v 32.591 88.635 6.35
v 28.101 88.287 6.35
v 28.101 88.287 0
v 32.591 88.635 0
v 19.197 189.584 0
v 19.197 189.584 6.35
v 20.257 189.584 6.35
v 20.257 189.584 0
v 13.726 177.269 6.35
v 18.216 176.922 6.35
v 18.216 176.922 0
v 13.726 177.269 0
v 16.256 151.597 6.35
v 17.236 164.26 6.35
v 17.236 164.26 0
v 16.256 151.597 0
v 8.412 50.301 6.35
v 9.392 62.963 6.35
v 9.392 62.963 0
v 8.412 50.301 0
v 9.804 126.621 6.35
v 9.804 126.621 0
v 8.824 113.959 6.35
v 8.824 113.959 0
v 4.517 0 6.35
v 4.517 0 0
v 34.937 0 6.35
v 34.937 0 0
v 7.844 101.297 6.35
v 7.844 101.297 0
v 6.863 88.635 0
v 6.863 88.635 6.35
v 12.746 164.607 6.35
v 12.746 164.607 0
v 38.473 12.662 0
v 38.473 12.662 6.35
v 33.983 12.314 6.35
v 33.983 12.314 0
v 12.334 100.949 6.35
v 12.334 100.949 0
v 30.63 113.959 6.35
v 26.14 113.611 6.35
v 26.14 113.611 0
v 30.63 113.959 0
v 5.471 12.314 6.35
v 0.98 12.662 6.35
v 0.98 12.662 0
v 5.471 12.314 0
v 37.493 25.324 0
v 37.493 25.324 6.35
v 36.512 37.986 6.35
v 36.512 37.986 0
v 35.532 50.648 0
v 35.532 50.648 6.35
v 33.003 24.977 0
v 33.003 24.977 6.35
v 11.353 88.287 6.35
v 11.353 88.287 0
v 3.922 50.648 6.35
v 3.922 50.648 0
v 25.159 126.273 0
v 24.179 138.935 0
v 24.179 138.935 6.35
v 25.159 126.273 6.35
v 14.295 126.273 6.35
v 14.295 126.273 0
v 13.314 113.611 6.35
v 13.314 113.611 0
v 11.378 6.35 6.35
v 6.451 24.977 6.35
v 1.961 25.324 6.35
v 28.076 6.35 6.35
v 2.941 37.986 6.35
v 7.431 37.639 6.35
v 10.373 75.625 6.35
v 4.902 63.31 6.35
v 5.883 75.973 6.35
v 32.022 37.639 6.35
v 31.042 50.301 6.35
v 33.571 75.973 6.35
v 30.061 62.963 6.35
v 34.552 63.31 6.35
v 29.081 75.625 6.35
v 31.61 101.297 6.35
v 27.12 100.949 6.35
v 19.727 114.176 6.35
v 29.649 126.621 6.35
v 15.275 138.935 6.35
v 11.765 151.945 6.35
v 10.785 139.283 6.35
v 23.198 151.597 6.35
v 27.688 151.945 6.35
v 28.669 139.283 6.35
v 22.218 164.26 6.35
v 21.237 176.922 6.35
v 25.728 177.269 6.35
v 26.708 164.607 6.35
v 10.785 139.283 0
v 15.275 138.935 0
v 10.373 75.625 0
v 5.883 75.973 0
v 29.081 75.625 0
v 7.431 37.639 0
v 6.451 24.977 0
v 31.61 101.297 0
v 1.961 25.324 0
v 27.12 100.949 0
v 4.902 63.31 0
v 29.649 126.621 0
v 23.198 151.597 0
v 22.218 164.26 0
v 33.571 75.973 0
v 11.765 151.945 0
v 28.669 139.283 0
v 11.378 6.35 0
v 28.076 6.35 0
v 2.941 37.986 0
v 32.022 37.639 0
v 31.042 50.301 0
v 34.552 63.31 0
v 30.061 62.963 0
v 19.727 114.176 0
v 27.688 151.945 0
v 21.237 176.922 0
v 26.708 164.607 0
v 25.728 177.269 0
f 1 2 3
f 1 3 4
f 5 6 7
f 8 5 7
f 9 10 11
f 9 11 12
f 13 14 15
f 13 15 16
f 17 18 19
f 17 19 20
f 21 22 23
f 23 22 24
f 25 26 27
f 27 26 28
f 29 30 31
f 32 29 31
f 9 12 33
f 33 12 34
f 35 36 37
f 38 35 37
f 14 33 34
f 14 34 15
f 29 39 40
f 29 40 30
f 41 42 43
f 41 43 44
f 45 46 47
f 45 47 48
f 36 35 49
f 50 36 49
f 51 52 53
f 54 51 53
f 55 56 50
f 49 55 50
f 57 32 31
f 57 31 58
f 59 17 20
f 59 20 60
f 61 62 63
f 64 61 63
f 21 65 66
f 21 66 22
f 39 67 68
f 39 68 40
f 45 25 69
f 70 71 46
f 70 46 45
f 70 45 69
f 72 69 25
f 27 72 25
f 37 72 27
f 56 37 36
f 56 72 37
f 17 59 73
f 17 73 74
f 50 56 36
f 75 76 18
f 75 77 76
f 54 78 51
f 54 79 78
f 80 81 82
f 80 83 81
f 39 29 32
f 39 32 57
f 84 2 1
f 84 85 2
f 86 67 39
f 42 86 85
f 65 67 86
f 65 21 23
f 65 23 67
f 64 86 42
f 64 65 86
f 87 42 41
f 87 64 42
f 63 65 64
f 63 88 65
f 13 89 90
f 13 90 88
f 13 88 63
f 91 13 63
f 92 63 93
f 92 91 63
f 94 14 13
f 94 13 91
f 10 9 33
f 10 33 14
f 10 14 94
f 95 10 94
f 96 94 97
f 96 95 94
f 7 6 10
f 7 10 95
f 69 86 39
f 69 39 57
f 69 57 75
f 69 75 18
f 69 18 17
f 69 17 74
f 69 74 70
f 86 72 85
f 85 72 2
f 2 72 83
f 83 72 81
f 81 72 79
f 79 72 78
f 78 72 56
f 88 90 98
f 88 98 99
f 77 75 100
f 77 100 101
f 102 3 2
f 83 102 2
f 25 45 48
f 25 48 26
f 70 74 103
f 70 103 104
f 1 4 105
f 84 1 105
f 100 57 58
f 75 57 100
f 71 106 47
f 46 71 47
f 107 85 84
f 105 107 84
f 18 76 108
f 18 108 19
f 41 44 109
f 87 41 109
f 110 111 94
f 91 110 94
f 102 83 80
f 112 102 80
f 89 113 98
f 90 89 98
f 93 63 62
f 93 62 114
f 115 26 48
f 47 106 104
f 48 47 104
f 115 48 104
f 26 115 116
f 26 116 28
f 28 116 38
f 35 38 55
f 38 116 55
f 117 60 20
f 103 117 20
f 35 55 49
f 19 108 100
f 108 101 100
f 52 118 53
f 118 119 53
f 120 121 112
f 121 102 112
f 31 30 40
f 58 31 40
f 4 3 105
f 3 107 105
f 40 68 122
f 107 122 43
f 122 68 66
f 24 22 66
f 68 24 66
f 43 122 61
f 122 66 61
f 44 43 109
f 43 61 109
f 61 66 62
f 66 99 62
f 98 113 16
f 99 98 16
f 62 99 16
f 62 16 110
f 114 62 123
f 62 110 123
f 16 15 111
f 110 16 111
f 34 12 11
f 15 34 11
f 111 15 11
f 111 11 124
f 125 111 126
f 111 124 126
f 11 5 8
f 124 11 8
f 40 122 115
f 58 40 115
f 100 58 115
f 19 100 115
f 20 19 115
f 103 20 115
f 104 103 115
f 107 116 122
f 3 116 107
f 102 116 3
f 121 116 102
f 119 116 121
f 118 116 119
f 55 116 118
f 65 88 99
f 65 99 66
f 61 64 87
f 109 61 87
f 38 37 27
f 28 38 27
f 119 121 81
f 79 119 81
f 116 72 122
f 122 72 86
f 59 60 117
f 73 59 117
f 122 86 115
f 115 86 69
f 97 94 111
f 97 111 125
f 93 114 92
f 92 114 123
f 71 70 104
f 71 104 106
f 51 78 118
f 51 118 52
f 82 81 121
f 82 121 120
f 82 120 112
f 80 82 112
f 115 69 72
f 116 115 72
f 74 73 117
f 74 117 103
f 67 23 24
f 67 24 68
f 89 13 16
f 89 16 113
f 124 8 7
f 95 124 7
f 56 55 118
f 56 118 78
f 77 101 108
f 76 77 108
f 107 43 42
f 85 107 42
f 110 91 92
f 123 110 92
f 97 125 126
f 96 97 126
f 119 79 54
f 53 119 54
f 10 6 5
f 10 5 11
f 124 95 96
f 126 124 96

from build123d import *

# Parameters (mm, degrees)
BOSS_EXTRUDE1_DEPTH   = 6.35
CUT_EXTRUDE1_DEPTH    = 258.879971193
LPATTERN1_COUNT       = 9
LPATTERN1_PITCH       = 25.4
CUT_EXTRUDE2_DEPTH    = 258.879971193
LPATTERN3_START       = -252.481631985
LPATTERN3_OUTLINE_W   = 4.50356866
LPATTERN3_OUTLINE_H   = 6.35
LPATTERN3_DEPTH       = 52.327499141
LPATTERN3_START_2     = -187.454132844
LPATTERN3_2_OUTLINE_W = 4.50356866
LPATTERN3_2_OUTLINE_H = 6.35
LPATTERN3_2_DEPTH     = 12.7
LPATTERN3_START_3     = -162.054132844
LPATTERN3_3_OUTLINE_W = 4.50356866
LPATTERN3_3_OUTLINE_H = 6.35
LPATTERN3_3_DEPTH     = 12.7
LPATTERN3_START_4     = -136.654132844
LPATTERN3_4_OUTLINE_W = 4.50356866
LPATTERN3_4_OUTLINE_H = 6.35
LPATTERN3_4_DEPTH     = 12.7
LPATTERN3_START_5     = -111.254132844
LPATTERN3_5_OUTLINE_W = 4.50356866
LPATTERN3_5_OUTLINE_H = 6.35
LPATTERN3_5_DEPTH     = 12.7
LPATTERN3_START_6     = -85.854132844
LPATTERN3_6_OUTLINE_W = 4.50356866
LPATTERN3_6_OUTLINE_H = 6.35
LPATTERN3_6_DEPTH     = 12.7
LPATTERN3_START_7     = -60.454132844
LPATTERN3_7_OUTLINE_W = 4.50356866
LPATTERN3_7_OUTLINE_H = 6.35
LPATTERN3_7_DEPTH     = 12.7
LPATTERN3_START_8     = -35.054132844
LPATTERN3_8_OUTLINE_W = 4.50356866
LPATTERN3_8_OUTLINE_H = 6.35
LPATTERN3_8_DEPTH     = 12.7
LPATTERN3_START_9     = -225.661600657
LPATTERN3_9_OUTLINE_W = 2.832525799
LPATTERN3_9_OUTLINE_H = 6.35
LPATTERN3_9_DEPTH     = 13.028393953
SKETCH4_W             = 28.782231323
SKETCH4_H             = 17.896251878
CUT_EXTRUDE3_DEPTH    = 207.312084539
CUT_EXTRUDE4_DEPTH    = 194.552412762


# Read off the part's stored shape, not the designer's step: LPattern3
with BuildPart() as part:
    # Sketch1 → Boss-Extrude1 (new body)
    with BuildSketch(Plane.XY):
        Polygon((19.726920908, 254.76489438), (0, 0), (39.453841816, 0), align=None)
    extrude(amount=BOSS_EXTRUDE1_DEPTH)

    # Sketch2 → Cut-Extrude1 (cut, through all)
    with BuildSketch(Plane.XY.offset(6.35)):
        Polygon((0, 0), (0.98044984, 12.662097698), (5.4705779, 12.314418708), (4.490128061, -0.34767899), align=None)
    cut_extrude1 = extrude(amount=-CUT_EXTRUDE1_DEPTH, mode=Mode.SUBTRACT)

    # LPattern1: Cut-Extrude1 ×9
    with Locations(*[Vector(0.07720077476736964, 0.9970155667667973, 0) * (i * LPATTERN1_PITCH) for i in range(1, LPATTERN1_COUNT)]):
        add(cut_extrude1, mode=Mode.SUBTRACT)

    # Sketch3 → Cut-Extrude2 (cut, through all)
    with BuildSketch(Plane.XY.offset(6.35)):
        Polygon((39.453841816, 0), (38.473391976, 12.662097698), (33.983263916, 12.314418708), (34.963713756, -0.34767899), align=None)
    extrude(amount=-CUT_EXTRUDE2_DEPTH, mode=Mode.SUBTRACT)

    # LPattern3 outline → LPattern3 (cut)
    with BuildSketch(Plane(origin=(0, 0, 0), x_dir=(0.9970155667667971, 0.07720077476736921, 0), z_dir=(0.07720077476736921, -0.9970155667667973, 0)).offset(LPATTERN3_START)):
        with Locations((37.084310129, 3.175)):
            Rectangle(LPATTERN3_OUTLINE_W, LPATTERN3_OUTLINE_H)
    extrude(amount=LPATTERN3_DEPTH, mode=Mode.SUBTRACT)

    # LPattern3 2 outline → LPattern3 2 (cut)
    with BuildSketch(Plane(origin=(0, 0, 0), x_dir=(0.9970155667667971, 0.07720077476736921, 0), z_dir=(0.07720077476736921, -0.9970155667667973, 0)).offset(LPATTERN3_START_2)):
        with Locations((37.084310129, 3.175)):
            Rectangle(LPATTERN3_2_OUTLINE_W, LPATTERN3_2_OUTLINE_H)
    extrude(amount=LPATTERN3_2_DEPTH, mode=Mode.SUBTRACT)

    # LPattern3 3 outline → LPattern3 3 (cut)
    with BuildSketch(Plane(origin=(0, 0, 0), x_dir=(0.9970155667667971, 0.07720077476736921, 0), z_dir=(0.07720077476736921, -0.9970155667667973, 0)).offset(LPATTERN3_START_3)):
        with Locations((37.084310129, 3.175)):
            Rectangle(LPATTERN3_3_OUTLINE_W, LPATTERN3_3_OUTLINE_H)
    extrude(amount=LPATTERN3_3_DEPTH, mode=Mode.SUBTRACT)

    # LPattern3 4 outline → LPattern3 4 (cut)
    with BuildSketch(Plane(origin=(0, 0, 0), x_dir=(0.9970155667667971, 0.07720077476736921, 0), z_dir=(0.07720077476736921, -0.9970155667667973, 0)).offset(LPATTERN3_START_4)):
        with Locations((37.084310129, 3.175)):
            Rectangle(LPATTERN3_4_OUTLINE_W, LPATTERN3_4_OUTLINE_H)
    extrude(amount=LPATTERN3_4_DEPTH, mode=Mode.SUBTRACT)

    # LPattern3 5 outline → LPattern3 5 (cut)
    with BuildSketch(Plane(origin=(0, 0, 0), x_dir=(0.9970155667667971, 0.07720077476736921, 0), z_dir=(0.07720077476736921, -0.9970155667667973, 0)).offset(LPATTERN3_START_5)):
        with Locations((37.084310129, 3.175)):
            Rectangle(LPATTERN3_5_OUTLINE_W, LPATTERN3_5_OUTLINE_H)
    extrude(amount=LPATTERN3_5_DEPTH, mode=Mode.SUBTRACT)

    # LPattern3 6 outline → LPattern3 6 (cut)
    with BuildSketch(Plane(origin=(0, 0, 0), x_dir=(0.9970155667667971, 0.07720077476736921, 0), z_dir=(0.07720077476736921, -0.9970155667667973, 0)).offset(LPATTERN3_START_6)):
        with Locations((37.084310129, 3.175)):
            Rectangle(LPATTERN3_6_OUTLINE_W, LPATTERN3_6_OUTLINE_H)
    extrude(amount=LPATTERN3_6_DEPTH, mode=Mode.SUBTRACT)

    # LPattern3 7 outline → LPattern3 7 (cut)
    with BuildSketch(Plane(origin=(0, 0, 0), x_dir=(0.9970155667667971, 0.07720077476736921, 0), z_dir=(0.07720077476736921, -0.9970155667667973, 0)).offset(LPATTERN3_START_7)):
        with Locations((37.084310129, 3.175)):
            Rectangle(LPATTERN3_7_OUTLINE_W, LPATTERN3_7_OUTLINE_H)
    extrude(amount=LPATTERN3_7_DEPTH, mode=Mode.SUBTRACT)

    # LPattern3 8 outline → LPattern3 8 (cut)
    with BuildSketch(Plane(origin=(0, 0, 0), x_dir=(0.9970155667667971, 0.07720077476736921, 0), z_dir=(0.07720077476736921, -0.9970155667667973, 0)).offset(LPATTERN3_START_8)):
        with Locations((37.084310129, 3.175)):
            Rectangle(LPATTERN3_8_OUTLINE_W, LPATTERN3_8_OUTLINE_H)
    extrude(amount=LPATTERN3_8_DEPTH, mode=Mode.SUBTRACT)

    # LPattern3 9 outline → LPattern3 9 (cut)
    with BuildSketch(Plane(origin=(0, 0, 0), x_dir=(0.9970155667667971, 0.07720077476736921, 0), z_dir=(0.07720077476736921, -0.9970155667667973, 0)).offset(LPATTERN3_START_9)):
        with Locations((33.416262899, 3.175)):
            Rectangle(LPATTERN3_9_OUTLINE_W, LPATTERN3_9_OUTLINE_H)
    extrude(amount=LPATTERN3_9_DEPTH, mode=Mode.SUBTRACT)

    # Sketch4 → Cut-Extrude3 (cut, through all)
    with BuildSketch(Plane.XY.offset(6.35)):
        with Locations((18.872321894, 198.531912418)):
            Rectangle(SKETCH4_W, SKETCH4_H)
    extrude(amount=-CUT_EXTRUDE3_DEPTH, mode=Mode.SUBTRACT)

    # Sketch5 → Cut-Extrude4 (cut, through all)
    with BuildSketch(Plane.XY.offset(6.35)):
        Polygon((19.726920908, 114.176037685), (11.377749715, 6.35), (28.076092101, 6.35), align=None)
    extrude(amount=-CUT_EXTRUDE4_DEPTH, mode=Mode.SUBTRACT)


solid = part.part
